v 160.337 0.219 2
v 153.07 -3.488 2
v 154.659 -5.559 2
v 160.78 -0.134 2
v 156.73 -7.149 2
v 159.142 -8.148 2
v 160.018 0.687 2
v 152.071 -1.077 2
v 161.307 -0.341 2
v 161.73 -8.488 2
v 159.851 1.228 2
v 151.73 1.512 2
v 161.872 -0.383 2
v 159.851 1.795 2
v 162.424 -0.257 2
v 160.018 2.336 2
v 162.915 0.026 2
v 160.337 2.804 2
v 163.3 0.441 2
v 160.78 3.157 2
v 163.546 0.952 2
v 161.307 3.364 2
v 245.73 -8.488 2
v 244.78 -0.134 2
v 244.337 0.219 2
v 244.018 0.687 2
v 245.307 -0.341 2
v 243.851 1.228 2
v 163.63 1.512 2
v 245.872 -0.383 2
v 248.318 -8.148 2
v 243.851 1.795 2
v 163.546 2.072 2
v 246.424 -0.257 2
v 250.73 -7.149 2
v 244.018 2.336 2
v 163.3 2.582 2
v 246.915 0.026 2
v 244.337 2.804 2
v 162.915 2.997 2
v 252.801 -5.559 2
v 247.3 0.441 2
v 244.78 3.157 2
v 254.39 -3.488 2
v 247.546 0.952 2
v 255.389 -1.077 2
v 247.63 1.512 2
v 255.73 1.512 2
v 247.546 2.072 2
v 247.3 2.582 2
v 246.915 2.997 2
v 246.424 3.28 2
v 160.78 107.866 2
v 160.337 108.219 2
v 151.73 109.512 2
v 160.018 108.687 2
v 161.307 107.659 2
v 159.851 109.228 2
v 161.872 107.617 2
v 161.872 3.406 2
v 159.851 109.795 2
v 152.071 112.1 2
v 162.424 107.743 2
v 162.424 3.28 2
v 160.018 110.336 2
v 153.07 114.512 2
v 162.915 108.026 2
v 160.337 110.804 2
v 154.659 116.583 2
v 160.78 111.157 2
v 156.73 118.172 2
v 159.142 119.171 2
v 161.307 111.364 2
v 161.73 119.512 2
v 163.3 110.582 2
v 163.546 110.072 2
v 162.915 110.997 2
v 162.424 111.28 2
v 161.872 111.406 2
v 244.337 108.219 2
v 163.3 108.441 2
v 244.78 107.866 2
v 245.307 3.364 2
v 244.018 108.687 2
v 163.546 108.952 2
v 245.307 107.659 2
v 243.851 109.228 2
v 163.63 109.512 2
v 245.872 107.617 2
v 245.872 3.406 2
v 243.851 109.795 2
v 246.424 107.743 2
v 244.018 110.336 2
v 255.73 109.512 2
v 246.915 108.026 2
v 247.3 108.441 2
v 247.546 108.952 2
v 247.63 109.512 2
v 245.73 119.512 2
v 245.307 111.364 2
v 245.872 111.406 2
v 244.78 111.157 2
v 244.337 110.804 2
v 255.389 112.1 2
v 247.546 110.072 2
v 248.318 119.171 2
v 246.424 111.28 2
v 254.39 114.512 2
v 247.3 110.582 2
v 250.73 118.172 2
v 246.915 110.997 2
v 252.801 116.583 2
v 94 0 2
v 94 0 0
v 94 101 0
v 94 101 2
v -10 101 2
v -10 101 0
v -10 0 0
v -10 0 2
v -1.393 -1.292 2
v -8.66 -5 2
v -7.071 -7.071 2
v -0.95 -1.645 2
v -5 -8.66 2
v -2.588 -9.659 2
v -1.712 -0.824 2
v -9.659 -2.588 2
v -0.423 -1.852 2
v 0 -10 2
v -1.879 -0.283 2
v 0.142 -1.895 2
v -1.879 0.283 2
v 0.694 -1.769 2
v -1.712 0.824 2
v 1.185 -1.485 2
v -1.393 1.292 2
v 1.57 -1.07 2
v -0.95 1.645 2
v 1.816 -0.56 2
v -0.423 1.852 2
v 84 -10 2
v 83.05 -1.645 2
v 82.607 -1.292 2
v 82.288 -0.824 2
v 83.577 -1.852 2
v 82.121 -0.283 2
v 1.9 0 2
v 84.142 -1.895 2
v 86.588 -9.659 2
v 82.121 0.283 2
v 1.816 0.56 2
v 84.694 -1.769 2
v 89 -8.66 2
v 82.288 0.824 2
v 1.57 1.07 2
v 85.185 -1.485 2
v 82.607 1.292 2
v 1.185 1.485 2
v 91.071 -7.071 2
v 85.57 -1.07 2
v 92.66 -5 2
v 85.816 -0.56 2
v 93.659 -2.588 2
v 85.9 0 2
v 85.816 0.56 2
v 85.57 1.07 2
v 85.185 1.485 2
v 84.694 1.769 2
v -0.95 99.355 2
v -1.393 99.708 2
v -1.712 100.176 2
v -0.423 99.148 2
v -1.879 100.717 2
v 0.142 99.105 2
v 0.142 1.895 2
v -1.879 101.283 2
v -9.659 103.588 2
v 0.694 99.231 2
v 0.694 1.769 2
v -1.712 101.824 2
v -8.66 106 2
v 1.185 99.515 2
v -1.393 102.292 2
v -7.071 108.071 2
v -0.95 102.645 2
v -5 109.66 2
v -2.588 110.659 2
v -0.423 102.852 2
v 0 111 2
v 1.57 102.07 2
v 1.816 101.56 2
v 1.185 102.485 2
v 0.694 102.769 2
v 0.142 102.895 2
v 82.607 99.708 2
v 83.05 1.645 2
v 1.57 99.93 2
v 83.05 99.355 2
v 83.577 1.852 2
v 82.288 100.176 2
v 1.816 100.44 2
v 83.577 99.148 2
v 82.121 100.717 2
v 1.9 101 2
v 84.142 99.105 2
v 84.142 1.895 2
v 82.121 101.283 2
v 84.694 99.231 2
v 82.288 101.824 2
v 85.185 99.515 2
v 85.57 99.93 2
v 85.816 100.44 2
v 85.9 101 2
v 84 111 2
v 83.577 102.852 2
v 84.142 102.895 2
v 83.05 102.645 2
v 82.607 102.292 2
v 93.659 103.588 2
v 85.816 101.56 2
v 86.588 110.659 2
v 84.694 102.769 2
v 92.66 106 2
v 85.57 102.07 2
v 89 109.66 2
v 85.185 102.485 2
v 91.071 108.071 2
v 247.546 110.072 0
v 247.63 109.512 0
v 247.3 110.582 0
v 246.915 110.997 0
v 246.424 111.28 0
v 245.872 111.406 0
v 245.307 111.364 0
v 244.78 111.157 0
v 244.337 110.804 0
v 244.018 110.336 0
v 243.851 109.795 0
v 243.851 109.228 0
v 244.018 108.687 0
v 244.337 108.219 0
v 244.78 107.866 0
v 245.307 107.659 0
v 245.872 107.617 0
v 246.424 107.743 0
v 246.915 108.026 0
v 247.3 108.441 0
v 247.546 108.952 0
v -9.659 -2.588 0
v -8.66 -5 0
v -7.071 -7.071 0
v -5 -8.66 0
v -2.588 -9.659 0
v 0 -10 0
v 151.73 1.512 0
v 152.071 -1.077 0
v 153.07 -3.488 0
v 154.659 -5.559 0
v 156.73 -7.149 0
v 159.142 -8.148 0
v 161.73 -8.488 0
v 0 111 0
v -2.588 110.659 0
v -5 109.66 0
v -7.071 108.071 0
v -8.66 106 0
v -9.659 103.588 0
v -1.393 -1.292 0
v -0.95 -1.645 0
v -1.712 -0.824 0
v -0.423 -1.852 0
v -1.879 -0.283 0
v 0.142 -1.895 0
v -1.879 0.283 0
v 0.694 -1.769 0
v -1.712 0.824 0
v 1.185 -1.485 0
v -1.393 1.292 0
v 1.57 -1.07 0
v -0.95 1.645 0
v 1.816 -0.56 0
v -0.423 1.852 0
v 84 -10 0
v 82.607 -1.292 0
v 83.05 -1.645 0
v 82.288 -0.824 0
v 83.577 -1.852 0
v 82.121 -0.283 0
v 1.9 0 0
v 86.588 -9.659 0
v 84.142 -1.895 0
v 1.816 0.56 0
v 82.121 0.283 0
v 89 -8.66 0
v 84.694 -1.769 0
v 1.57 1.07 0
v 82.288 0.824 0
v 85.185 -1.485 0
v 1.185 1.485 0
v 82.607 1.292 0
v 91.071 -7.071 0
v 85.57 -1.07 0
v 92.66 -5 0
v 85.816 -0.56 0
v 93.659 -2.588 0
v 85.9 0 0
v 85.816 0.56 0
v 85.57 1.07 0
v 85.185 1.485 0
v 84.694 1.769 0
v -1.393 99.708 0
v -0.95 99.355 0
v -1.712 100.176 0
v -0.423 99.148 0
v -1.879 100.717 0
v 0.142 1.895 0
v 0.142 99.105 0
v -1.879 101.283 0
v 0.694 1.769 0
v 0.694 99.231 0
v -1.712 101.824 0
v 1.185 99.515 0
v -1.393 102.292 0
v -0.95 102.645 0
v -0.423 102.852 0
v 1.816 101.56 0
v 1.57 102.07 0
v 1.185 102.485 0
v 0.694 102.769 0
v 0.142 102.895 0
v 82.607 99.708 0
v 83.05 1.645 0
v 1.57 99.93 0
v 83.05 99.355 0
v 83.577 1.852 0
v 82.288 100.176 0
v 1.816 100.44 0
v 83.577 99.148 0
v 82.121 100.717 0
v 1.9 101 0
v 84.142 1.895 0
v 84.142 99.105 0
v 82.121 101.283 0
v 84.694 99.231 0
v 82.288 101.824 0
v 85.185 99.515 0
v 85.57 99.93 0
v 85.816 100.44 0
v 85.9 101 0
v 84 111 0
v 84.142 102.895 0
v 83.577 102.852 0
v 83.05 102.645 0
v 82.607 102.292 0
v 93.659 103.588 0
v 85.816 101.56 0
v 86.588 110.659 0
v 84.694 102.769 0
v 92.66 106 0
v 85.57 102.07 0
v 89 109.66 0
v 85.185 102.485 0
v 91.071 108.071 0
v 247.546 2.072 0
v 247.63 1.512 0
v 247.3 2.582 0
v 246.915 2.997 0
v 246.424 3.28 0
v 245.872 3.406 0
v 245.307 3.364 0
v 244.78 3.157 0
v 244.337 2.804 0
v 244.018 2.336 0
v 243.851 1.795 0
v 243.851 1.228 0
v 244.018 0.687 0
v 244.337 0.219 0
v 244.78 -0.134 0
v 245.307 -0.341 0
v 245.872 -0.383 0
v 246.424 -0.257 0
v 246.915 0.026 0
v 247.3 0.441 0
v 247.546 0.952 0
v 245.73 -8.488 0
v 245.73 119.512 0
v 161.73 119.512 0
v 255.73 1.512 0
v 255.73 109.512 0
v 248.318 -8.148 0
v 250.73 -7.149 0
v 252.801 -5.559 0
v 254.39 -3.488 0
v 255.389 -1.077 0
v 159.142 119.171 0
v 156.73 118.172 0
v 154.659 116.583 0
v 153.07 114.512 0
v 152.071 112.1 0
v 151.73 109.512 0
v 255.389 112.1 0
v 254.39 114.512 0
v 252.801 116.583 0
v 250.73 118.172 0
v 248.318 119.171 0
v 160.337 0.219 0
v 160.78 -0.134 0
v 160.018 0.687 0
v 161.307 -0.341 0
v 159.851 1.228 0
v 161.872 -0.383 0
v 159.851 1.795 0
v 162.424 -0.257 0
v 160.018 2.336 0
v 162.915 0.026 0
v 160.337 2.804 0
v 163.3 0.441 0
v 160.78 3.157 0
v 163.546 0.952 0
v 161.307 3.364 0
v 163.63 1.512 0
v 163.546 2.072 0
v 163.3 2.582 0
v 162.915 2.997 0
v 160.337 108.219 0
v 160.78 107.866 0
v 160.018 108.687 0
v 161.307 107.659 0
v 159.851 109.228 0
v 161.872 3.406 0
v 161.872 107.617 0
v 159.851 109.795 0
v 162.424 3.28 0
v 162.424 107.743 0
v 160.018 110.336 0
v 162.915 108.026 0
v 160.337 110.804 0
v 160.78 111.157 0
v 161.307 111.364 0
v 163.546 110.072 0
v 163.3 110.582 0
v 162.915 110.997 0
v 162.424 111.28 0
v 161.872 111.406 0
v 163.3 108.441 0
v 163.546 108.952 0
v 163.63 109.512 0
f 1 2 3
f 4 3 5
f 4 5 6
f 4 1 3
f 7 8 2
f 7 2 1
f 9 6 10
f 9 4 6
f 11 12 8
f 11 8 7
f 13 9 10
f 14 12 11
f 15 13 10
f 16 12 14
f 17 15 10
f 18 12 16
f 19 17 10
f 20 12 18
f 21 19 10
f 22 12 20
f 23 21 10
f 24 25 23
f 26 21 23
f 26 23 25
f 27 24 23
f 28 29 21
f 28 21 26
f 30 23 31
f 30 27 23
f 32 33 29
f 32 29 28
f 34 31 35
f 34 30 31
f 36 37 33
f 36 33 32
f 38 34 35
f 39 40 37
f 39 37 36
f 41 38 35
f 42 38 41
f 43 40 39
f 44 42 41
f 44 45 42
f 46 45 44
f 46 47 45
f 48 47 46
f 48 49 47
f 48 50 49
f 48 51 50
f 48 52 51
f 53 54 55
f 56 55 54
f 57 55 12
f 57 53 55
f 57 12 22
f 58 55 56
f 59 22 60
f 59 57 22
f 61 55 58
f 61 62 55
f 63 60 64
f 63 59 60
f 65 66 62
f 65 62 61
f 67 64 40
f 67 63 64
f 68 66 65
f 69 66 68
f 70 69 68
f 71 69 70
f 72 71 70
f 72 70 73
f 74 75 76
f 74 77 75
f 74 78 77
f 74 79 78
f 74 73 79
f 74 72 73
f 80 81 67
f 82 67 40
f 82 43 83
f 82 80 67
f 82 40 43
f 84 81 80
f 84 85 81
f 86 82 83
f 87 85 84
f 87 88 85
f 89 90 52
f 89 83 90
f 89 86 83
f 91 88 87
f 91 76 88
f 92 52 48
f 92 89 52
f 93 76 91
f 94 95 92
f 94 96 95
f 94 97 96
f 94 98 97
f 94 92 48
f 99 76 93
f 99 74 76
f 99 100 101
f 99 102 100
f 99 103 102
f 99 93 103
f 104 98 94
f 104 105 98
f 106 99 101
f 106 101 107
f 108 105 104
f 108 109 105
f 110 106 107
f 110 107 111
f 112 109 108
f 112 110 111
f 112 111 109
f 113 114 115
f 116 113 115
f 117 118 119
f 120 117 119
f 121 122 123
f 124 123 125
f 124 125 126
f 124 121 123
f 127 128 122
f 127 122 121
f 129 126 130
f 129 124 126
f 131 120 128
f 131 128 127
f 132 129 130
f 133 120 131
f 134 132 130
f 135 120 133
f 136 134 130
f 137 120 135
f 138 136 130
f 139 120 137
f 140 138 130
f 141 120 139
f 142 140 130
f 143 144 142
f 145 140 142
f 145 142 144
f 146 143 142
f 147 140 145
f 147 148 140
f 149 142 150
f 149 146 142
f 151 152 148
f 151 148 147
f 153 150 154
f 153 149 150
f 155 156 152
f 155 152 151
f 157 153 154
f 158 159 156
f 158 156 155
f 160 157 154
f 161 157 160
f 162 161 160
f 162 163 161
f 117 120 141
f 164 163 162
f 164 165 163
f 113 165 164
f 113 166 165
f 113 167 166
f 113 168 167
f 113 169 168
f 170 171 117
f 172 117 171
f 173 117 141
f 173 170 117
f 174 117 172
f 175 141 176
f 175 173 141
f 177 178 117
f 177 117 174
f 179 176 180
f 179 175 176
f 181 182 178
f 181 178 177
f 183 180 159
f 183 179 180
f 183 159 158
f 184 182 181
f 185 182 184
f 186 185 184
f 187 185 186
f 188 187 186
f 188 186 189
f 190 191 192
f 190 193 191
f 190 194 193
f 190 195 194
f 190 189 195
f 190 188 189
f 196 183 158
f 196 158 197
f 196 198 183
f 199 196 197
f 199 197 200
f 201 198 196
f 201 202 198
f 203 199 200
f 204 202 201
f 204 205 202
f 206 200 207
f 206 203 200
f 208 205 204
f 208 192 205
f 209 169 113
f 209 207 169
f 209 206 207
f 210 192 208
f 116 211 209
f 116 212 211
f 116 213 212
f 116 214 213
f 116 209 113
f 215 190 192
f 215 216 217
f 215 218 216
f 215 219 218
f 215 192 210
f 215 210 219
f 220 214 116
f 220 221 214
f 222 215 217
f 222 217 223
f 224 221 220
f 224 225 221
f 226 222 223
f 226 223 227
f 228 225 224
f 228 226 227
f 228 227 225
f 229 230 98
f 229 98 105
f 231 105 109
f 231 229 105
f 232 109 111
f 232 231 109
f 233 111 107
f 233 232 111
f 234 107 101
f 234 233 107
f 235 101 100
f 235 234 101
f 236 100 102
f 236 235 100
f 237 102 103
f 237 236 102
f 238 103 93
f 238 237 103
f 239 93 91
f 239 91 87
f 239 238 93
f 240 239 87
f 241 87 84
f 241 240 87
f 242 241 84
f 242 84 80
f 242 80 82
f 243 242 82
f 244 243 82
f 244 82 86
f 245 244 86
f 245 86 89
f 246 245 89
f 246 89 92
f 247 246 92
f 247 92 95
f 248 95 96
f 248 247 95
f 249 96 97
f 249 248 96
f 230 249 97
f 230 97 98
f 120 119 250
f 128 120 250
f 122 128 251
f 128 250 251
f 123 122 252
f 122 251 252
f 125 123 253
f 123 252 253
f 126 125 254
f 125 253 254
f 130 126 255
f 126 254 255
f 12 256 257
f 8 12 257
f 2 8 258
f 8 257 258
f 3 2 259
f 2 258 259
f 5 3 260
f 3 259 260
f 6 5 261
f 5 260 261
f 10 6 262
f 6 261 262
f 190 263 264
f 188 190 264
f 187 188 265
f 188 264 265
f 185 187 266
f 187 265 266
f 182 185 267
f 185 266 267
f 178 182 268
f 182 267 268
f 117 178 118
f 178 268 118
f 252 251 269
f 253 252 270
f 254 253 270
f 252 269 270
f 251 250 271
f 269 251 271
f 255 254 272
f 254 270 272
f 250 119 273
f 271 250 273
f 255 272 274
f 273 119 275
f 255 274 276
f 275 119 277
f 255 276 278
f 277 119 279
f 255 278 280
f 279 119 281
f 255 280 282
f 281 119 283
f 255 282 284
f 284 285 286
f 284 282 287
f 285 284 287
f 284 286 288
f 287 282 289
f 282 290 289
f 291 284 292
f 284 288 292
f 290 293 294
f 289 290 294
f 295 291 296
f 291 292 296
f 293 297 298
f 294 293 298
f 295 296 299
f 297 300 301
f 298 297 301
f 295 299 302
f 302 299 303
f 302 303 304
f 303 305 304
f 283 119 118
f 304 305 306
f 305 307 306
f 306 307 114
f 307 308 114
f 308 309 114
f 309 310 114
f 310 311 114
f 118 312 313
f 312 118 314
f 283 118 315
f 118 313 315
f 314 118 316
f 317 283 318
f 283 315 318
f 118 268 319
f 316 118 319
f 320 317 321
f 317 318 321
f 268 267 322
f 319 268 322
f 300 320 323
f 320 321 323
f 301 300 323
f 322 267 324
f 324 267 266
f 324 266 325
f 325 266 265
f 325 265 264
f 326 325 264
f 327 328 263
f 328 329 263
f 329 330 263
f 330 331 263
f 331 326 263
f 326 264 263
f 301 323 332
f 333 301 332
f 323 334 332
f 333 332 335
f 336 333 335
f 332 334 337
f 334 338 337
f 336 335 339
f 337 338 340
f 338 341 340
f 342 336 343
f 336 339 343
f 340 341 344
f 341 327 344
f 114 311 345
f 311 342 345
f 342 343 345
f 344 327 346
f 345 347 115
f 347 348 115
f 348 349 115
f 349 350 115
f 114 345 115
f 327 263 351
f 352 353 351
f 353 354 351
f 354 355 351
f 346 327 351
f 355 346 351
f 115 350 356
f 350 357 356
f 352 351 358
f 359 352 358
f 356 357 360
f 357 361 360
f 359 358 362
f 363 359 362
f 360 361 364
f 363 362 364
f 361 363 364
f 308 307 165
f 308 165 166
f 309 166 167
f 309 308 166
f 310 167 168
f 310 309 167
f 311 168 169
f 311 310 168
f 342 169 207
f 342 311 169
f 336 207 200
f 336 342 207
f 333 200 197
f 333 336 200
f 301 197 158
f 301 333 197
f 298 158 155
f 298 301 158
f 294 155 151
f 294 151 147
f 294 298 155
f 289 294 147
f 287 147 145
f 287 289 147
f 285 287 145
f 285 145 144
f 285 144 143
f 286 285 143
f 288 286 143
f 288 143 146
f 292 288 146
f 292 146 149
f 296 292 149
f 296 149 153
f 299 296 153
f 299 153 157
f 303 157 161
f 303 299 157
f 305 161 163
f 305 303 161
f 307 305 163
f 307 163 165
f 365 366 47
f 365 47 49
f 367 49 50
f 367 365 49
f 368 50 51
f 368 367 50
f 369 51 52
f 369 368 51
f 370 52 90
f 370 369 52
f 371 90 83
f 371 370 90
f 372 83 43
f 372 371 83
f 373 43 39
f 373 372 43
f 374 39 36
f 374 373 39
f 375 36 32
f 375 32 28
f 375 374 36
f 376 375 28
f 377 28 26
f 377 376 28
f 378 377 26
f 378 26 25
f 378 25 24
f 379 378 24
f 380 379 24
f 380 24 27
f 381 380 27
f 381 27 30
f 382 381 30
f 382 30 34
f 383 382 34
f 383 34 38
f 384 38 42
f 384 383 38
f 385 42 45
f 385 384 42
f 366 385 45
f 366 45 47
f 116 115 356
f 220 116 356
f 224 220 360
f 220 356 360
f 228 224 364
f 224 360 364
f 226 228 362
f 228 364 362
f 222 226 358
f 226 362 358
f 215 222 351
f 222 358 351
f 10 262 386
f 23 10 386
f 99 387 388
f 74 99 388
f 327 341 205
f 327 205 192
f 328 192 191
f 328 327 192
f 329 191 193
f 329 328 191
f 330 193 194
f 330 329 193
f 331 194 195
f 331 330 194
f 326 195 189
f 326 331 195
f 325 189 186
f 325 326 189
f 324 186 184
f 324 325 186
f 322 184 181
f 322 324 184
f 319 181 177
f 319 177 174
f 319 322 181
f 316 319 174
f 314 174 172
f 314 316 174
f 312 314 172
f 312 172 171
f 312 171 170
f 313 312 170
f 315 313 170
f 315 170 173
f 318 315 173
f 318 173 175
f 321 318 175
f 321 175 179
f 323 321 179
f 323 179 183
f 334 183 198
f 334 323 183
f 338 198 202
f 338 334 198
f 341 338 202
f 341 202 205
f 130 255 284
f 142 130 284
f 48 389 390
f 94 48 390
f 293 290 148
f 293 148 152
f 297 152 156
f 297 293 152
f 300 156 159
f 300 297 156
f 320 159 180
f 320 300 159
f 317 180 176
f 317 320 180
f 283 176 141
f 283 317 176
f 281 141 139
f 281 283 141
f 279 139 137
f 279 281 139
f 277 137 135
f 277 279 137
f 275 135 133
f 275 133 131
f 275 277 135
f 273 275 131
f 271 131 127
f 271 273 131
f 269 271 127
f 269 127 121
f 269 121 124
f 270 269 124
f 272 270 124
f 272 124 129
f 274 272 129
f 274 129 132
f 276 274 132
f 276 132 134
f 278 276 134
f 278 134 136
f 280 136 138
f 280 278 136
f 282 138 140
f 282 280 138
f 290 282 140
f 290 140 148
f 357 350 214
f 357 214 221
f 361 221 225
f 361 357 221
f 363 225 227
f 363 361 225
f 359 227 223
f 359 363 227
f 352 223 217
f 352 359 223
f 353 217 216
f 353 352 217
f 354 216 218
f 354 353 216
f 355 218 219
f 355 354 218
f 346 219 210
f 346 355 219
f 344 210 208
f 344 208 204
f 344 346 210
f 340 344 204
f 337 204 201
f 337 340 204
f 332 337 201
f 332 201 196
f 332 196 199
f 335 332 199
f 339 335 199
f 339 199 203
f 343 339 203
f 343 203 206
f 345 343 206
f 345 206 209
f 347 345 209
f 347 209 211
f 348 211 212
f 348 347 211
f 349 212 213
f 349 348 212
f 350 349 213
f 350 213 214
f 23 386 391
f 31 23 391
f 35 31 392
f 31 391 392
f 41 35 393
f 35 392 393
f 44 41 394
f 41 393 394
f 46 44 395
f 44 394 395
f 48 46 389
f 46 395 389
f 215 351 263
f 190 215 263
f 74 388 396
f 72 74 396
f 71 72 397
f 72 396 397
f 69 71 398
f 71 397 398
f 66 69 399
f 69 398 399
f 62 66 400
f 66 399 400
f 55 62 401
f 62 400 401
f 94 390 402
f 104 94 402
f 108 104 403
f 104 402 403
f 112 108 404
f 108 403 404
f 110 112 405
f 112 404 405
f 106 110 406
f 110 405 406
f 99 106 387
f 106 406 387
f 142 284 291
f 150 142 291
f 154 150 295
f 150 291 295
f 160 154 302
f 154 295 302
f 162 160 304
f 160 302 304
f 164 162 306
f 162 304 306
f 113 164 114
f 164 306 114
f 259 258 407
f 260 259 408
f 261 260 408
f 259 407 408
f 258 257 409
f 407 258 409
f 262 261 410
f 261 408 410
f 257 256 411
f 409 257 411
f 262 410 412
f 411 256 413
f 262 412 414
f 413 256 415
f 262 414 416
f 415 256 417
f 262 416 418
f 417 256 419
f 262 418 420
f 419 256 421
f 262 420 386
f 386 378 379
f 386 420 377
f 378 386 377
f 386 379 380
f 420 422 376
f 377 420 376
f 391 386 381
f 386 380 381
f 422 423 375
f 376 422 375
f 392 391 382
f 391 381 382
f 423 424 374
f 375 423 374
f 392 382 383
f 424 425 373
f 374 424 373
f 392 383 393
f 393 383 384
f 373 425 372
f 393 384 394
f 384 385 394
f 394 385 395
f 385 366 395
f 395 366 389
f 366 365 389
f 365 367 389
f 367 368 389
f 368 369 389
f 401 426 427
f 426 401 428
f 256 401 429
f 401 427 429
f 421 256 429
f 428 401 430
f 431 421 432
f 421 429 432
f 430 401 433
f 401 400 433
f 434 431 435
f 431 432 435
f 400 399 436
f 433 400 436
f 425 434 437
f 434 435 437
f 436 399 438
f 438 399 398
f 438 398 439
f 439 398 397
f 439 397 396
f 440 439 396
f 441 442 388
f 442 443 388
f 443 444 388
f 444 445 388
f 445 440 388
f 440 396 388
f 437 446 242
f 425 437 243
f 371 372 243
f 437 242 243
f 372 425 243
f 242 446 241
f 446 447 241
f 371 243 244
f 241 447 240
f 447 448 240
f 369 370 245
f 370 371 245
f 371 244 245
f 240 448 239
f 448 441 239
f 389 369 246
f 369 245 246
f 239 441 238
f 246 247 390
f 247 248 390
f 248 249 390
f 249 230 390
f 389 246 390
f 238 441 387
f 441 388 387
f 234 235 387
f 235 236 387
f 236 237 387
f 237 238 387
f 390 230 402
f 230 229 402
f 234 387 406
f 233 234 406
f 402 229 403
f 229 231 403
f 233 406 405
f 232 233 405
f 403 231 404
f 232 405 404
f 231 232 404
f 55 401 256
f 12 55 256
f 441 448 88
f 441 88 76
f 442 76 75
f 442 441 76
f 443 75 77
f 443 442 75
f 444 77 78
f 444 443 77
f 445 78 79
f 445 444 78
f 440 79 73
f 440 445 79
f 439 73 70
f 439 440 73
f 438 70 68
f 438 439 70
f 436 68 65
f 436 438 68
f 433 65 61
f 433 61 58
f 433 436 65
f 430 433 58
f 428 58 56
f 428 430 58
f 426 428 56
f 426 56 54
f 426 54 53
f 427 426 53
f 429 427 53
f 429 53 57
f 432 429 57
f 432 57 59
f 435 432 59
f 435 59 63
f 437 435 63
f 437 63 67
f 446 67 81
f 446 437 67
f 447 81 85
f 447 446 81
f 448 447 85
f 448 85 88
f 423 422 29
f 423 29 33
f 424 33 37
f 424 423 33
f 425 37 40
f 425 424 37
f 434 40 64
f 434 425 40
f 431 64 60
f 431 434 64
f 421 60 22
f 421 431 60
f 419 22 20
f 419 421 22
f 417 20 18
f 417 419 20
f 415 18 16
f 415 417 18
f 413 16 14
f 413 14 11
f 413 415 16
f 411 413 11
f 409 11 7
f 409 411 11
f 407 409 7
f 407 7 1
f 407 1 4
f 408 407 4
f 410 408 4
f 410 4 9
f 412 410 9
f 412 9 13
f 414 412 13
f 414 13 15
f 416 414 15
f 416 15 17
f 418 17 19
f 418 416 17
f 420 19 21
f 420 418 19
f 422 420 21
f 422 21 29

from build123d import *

# Parameters (mm, degrees)
F0_R     = 1.9
F1_DEPTH = 2
F2_R     = 1.9
F3_DEPTH = 2


with BuildPart() as f1:
    # F0 (on Top) → F1 (new body)
    with BuildSketch(Plane.XY):
        with BuildLine():
            Line((84, 111), (0, 111))
            ThreePointArc((0, 111), (-7.071068, 108.071068), (-10, 101))
            Line((-10, 101), (-10, 0))
            ThreePointArc((-10, 0), (-7.071068, -7.071068), (0, -10))
            Line((0, -10), (84, -10))
            ThreePointArc((84, -10), (91.071068, -7.071068), (94, 0))
            Line((94, 0), (94, 101))
            ThreePointArc((94, 101), (91.071068, 108.071068), (84, 111))
        make_face()
        Circle(F0_R, mode=Mode.SUBTRACT)
        with Locations((84, 0)):
            Circle(F0_R, mode=Mode.SUBTRACT)
        with Locations((0, 101)):
            Circle(F0_R, mode=Mode.SUBTRACT)
        with Locations((84, 101)):
            Circle(F0_R, mode=Mode.SUBTRACT)
    extrude(amount=F1_DEPTH)


with BuildPart() as f3:
    # F2 (on Top) → F3 (new body)
    with BuildSketch(Plane.XY):
        with BuildLine():
            Line((245.730002, 119.511579), (161.730002, 119.511579))
            ThreePointArc((161.730002, 119.511579), (154.658934, 116.582647), (151.730002, 109.511579))
            Line((151.730002, 109.511579), (151.730002, 1.511579))
            ThreePointArc((151.730002, 1.511579), (154.658934, -5.559489), (161.730002, -8.488421))
            Line((161.730002, -8.488421), (245.730002, -8.488421))
            ThreePointArc((245.730002, -8.488421), (252.80107, -5.559489), (255.730002, 1.511579))
            Line((255.730002, 1.511579), (255.730002, 109.511579))
            ThreePointArc((255.730002, 109.511579), (252.80107, 116.582647), (245.730002, 119.511579))
        make_face()
        with Locations((161.730002, 1.511579)):
            Circle(F2_R, mode=Mode.SUBTRACT)
        with Locations((245.730002, 1.511579)):
            Circle(F2_R, mode=Mode.SUBTRACT)
        with Locations((161.730002, 109.511579)):
            Circle(F2_R, mode=Mode.SUBTRACT)
        with Locations((245.730002, 109.511579)):
            Circle(F2_R, mode=Mode.SUBTRACT)
    extrude(amount=F3_DEPTH)


solid = Compound([f1.part, f3.part])
